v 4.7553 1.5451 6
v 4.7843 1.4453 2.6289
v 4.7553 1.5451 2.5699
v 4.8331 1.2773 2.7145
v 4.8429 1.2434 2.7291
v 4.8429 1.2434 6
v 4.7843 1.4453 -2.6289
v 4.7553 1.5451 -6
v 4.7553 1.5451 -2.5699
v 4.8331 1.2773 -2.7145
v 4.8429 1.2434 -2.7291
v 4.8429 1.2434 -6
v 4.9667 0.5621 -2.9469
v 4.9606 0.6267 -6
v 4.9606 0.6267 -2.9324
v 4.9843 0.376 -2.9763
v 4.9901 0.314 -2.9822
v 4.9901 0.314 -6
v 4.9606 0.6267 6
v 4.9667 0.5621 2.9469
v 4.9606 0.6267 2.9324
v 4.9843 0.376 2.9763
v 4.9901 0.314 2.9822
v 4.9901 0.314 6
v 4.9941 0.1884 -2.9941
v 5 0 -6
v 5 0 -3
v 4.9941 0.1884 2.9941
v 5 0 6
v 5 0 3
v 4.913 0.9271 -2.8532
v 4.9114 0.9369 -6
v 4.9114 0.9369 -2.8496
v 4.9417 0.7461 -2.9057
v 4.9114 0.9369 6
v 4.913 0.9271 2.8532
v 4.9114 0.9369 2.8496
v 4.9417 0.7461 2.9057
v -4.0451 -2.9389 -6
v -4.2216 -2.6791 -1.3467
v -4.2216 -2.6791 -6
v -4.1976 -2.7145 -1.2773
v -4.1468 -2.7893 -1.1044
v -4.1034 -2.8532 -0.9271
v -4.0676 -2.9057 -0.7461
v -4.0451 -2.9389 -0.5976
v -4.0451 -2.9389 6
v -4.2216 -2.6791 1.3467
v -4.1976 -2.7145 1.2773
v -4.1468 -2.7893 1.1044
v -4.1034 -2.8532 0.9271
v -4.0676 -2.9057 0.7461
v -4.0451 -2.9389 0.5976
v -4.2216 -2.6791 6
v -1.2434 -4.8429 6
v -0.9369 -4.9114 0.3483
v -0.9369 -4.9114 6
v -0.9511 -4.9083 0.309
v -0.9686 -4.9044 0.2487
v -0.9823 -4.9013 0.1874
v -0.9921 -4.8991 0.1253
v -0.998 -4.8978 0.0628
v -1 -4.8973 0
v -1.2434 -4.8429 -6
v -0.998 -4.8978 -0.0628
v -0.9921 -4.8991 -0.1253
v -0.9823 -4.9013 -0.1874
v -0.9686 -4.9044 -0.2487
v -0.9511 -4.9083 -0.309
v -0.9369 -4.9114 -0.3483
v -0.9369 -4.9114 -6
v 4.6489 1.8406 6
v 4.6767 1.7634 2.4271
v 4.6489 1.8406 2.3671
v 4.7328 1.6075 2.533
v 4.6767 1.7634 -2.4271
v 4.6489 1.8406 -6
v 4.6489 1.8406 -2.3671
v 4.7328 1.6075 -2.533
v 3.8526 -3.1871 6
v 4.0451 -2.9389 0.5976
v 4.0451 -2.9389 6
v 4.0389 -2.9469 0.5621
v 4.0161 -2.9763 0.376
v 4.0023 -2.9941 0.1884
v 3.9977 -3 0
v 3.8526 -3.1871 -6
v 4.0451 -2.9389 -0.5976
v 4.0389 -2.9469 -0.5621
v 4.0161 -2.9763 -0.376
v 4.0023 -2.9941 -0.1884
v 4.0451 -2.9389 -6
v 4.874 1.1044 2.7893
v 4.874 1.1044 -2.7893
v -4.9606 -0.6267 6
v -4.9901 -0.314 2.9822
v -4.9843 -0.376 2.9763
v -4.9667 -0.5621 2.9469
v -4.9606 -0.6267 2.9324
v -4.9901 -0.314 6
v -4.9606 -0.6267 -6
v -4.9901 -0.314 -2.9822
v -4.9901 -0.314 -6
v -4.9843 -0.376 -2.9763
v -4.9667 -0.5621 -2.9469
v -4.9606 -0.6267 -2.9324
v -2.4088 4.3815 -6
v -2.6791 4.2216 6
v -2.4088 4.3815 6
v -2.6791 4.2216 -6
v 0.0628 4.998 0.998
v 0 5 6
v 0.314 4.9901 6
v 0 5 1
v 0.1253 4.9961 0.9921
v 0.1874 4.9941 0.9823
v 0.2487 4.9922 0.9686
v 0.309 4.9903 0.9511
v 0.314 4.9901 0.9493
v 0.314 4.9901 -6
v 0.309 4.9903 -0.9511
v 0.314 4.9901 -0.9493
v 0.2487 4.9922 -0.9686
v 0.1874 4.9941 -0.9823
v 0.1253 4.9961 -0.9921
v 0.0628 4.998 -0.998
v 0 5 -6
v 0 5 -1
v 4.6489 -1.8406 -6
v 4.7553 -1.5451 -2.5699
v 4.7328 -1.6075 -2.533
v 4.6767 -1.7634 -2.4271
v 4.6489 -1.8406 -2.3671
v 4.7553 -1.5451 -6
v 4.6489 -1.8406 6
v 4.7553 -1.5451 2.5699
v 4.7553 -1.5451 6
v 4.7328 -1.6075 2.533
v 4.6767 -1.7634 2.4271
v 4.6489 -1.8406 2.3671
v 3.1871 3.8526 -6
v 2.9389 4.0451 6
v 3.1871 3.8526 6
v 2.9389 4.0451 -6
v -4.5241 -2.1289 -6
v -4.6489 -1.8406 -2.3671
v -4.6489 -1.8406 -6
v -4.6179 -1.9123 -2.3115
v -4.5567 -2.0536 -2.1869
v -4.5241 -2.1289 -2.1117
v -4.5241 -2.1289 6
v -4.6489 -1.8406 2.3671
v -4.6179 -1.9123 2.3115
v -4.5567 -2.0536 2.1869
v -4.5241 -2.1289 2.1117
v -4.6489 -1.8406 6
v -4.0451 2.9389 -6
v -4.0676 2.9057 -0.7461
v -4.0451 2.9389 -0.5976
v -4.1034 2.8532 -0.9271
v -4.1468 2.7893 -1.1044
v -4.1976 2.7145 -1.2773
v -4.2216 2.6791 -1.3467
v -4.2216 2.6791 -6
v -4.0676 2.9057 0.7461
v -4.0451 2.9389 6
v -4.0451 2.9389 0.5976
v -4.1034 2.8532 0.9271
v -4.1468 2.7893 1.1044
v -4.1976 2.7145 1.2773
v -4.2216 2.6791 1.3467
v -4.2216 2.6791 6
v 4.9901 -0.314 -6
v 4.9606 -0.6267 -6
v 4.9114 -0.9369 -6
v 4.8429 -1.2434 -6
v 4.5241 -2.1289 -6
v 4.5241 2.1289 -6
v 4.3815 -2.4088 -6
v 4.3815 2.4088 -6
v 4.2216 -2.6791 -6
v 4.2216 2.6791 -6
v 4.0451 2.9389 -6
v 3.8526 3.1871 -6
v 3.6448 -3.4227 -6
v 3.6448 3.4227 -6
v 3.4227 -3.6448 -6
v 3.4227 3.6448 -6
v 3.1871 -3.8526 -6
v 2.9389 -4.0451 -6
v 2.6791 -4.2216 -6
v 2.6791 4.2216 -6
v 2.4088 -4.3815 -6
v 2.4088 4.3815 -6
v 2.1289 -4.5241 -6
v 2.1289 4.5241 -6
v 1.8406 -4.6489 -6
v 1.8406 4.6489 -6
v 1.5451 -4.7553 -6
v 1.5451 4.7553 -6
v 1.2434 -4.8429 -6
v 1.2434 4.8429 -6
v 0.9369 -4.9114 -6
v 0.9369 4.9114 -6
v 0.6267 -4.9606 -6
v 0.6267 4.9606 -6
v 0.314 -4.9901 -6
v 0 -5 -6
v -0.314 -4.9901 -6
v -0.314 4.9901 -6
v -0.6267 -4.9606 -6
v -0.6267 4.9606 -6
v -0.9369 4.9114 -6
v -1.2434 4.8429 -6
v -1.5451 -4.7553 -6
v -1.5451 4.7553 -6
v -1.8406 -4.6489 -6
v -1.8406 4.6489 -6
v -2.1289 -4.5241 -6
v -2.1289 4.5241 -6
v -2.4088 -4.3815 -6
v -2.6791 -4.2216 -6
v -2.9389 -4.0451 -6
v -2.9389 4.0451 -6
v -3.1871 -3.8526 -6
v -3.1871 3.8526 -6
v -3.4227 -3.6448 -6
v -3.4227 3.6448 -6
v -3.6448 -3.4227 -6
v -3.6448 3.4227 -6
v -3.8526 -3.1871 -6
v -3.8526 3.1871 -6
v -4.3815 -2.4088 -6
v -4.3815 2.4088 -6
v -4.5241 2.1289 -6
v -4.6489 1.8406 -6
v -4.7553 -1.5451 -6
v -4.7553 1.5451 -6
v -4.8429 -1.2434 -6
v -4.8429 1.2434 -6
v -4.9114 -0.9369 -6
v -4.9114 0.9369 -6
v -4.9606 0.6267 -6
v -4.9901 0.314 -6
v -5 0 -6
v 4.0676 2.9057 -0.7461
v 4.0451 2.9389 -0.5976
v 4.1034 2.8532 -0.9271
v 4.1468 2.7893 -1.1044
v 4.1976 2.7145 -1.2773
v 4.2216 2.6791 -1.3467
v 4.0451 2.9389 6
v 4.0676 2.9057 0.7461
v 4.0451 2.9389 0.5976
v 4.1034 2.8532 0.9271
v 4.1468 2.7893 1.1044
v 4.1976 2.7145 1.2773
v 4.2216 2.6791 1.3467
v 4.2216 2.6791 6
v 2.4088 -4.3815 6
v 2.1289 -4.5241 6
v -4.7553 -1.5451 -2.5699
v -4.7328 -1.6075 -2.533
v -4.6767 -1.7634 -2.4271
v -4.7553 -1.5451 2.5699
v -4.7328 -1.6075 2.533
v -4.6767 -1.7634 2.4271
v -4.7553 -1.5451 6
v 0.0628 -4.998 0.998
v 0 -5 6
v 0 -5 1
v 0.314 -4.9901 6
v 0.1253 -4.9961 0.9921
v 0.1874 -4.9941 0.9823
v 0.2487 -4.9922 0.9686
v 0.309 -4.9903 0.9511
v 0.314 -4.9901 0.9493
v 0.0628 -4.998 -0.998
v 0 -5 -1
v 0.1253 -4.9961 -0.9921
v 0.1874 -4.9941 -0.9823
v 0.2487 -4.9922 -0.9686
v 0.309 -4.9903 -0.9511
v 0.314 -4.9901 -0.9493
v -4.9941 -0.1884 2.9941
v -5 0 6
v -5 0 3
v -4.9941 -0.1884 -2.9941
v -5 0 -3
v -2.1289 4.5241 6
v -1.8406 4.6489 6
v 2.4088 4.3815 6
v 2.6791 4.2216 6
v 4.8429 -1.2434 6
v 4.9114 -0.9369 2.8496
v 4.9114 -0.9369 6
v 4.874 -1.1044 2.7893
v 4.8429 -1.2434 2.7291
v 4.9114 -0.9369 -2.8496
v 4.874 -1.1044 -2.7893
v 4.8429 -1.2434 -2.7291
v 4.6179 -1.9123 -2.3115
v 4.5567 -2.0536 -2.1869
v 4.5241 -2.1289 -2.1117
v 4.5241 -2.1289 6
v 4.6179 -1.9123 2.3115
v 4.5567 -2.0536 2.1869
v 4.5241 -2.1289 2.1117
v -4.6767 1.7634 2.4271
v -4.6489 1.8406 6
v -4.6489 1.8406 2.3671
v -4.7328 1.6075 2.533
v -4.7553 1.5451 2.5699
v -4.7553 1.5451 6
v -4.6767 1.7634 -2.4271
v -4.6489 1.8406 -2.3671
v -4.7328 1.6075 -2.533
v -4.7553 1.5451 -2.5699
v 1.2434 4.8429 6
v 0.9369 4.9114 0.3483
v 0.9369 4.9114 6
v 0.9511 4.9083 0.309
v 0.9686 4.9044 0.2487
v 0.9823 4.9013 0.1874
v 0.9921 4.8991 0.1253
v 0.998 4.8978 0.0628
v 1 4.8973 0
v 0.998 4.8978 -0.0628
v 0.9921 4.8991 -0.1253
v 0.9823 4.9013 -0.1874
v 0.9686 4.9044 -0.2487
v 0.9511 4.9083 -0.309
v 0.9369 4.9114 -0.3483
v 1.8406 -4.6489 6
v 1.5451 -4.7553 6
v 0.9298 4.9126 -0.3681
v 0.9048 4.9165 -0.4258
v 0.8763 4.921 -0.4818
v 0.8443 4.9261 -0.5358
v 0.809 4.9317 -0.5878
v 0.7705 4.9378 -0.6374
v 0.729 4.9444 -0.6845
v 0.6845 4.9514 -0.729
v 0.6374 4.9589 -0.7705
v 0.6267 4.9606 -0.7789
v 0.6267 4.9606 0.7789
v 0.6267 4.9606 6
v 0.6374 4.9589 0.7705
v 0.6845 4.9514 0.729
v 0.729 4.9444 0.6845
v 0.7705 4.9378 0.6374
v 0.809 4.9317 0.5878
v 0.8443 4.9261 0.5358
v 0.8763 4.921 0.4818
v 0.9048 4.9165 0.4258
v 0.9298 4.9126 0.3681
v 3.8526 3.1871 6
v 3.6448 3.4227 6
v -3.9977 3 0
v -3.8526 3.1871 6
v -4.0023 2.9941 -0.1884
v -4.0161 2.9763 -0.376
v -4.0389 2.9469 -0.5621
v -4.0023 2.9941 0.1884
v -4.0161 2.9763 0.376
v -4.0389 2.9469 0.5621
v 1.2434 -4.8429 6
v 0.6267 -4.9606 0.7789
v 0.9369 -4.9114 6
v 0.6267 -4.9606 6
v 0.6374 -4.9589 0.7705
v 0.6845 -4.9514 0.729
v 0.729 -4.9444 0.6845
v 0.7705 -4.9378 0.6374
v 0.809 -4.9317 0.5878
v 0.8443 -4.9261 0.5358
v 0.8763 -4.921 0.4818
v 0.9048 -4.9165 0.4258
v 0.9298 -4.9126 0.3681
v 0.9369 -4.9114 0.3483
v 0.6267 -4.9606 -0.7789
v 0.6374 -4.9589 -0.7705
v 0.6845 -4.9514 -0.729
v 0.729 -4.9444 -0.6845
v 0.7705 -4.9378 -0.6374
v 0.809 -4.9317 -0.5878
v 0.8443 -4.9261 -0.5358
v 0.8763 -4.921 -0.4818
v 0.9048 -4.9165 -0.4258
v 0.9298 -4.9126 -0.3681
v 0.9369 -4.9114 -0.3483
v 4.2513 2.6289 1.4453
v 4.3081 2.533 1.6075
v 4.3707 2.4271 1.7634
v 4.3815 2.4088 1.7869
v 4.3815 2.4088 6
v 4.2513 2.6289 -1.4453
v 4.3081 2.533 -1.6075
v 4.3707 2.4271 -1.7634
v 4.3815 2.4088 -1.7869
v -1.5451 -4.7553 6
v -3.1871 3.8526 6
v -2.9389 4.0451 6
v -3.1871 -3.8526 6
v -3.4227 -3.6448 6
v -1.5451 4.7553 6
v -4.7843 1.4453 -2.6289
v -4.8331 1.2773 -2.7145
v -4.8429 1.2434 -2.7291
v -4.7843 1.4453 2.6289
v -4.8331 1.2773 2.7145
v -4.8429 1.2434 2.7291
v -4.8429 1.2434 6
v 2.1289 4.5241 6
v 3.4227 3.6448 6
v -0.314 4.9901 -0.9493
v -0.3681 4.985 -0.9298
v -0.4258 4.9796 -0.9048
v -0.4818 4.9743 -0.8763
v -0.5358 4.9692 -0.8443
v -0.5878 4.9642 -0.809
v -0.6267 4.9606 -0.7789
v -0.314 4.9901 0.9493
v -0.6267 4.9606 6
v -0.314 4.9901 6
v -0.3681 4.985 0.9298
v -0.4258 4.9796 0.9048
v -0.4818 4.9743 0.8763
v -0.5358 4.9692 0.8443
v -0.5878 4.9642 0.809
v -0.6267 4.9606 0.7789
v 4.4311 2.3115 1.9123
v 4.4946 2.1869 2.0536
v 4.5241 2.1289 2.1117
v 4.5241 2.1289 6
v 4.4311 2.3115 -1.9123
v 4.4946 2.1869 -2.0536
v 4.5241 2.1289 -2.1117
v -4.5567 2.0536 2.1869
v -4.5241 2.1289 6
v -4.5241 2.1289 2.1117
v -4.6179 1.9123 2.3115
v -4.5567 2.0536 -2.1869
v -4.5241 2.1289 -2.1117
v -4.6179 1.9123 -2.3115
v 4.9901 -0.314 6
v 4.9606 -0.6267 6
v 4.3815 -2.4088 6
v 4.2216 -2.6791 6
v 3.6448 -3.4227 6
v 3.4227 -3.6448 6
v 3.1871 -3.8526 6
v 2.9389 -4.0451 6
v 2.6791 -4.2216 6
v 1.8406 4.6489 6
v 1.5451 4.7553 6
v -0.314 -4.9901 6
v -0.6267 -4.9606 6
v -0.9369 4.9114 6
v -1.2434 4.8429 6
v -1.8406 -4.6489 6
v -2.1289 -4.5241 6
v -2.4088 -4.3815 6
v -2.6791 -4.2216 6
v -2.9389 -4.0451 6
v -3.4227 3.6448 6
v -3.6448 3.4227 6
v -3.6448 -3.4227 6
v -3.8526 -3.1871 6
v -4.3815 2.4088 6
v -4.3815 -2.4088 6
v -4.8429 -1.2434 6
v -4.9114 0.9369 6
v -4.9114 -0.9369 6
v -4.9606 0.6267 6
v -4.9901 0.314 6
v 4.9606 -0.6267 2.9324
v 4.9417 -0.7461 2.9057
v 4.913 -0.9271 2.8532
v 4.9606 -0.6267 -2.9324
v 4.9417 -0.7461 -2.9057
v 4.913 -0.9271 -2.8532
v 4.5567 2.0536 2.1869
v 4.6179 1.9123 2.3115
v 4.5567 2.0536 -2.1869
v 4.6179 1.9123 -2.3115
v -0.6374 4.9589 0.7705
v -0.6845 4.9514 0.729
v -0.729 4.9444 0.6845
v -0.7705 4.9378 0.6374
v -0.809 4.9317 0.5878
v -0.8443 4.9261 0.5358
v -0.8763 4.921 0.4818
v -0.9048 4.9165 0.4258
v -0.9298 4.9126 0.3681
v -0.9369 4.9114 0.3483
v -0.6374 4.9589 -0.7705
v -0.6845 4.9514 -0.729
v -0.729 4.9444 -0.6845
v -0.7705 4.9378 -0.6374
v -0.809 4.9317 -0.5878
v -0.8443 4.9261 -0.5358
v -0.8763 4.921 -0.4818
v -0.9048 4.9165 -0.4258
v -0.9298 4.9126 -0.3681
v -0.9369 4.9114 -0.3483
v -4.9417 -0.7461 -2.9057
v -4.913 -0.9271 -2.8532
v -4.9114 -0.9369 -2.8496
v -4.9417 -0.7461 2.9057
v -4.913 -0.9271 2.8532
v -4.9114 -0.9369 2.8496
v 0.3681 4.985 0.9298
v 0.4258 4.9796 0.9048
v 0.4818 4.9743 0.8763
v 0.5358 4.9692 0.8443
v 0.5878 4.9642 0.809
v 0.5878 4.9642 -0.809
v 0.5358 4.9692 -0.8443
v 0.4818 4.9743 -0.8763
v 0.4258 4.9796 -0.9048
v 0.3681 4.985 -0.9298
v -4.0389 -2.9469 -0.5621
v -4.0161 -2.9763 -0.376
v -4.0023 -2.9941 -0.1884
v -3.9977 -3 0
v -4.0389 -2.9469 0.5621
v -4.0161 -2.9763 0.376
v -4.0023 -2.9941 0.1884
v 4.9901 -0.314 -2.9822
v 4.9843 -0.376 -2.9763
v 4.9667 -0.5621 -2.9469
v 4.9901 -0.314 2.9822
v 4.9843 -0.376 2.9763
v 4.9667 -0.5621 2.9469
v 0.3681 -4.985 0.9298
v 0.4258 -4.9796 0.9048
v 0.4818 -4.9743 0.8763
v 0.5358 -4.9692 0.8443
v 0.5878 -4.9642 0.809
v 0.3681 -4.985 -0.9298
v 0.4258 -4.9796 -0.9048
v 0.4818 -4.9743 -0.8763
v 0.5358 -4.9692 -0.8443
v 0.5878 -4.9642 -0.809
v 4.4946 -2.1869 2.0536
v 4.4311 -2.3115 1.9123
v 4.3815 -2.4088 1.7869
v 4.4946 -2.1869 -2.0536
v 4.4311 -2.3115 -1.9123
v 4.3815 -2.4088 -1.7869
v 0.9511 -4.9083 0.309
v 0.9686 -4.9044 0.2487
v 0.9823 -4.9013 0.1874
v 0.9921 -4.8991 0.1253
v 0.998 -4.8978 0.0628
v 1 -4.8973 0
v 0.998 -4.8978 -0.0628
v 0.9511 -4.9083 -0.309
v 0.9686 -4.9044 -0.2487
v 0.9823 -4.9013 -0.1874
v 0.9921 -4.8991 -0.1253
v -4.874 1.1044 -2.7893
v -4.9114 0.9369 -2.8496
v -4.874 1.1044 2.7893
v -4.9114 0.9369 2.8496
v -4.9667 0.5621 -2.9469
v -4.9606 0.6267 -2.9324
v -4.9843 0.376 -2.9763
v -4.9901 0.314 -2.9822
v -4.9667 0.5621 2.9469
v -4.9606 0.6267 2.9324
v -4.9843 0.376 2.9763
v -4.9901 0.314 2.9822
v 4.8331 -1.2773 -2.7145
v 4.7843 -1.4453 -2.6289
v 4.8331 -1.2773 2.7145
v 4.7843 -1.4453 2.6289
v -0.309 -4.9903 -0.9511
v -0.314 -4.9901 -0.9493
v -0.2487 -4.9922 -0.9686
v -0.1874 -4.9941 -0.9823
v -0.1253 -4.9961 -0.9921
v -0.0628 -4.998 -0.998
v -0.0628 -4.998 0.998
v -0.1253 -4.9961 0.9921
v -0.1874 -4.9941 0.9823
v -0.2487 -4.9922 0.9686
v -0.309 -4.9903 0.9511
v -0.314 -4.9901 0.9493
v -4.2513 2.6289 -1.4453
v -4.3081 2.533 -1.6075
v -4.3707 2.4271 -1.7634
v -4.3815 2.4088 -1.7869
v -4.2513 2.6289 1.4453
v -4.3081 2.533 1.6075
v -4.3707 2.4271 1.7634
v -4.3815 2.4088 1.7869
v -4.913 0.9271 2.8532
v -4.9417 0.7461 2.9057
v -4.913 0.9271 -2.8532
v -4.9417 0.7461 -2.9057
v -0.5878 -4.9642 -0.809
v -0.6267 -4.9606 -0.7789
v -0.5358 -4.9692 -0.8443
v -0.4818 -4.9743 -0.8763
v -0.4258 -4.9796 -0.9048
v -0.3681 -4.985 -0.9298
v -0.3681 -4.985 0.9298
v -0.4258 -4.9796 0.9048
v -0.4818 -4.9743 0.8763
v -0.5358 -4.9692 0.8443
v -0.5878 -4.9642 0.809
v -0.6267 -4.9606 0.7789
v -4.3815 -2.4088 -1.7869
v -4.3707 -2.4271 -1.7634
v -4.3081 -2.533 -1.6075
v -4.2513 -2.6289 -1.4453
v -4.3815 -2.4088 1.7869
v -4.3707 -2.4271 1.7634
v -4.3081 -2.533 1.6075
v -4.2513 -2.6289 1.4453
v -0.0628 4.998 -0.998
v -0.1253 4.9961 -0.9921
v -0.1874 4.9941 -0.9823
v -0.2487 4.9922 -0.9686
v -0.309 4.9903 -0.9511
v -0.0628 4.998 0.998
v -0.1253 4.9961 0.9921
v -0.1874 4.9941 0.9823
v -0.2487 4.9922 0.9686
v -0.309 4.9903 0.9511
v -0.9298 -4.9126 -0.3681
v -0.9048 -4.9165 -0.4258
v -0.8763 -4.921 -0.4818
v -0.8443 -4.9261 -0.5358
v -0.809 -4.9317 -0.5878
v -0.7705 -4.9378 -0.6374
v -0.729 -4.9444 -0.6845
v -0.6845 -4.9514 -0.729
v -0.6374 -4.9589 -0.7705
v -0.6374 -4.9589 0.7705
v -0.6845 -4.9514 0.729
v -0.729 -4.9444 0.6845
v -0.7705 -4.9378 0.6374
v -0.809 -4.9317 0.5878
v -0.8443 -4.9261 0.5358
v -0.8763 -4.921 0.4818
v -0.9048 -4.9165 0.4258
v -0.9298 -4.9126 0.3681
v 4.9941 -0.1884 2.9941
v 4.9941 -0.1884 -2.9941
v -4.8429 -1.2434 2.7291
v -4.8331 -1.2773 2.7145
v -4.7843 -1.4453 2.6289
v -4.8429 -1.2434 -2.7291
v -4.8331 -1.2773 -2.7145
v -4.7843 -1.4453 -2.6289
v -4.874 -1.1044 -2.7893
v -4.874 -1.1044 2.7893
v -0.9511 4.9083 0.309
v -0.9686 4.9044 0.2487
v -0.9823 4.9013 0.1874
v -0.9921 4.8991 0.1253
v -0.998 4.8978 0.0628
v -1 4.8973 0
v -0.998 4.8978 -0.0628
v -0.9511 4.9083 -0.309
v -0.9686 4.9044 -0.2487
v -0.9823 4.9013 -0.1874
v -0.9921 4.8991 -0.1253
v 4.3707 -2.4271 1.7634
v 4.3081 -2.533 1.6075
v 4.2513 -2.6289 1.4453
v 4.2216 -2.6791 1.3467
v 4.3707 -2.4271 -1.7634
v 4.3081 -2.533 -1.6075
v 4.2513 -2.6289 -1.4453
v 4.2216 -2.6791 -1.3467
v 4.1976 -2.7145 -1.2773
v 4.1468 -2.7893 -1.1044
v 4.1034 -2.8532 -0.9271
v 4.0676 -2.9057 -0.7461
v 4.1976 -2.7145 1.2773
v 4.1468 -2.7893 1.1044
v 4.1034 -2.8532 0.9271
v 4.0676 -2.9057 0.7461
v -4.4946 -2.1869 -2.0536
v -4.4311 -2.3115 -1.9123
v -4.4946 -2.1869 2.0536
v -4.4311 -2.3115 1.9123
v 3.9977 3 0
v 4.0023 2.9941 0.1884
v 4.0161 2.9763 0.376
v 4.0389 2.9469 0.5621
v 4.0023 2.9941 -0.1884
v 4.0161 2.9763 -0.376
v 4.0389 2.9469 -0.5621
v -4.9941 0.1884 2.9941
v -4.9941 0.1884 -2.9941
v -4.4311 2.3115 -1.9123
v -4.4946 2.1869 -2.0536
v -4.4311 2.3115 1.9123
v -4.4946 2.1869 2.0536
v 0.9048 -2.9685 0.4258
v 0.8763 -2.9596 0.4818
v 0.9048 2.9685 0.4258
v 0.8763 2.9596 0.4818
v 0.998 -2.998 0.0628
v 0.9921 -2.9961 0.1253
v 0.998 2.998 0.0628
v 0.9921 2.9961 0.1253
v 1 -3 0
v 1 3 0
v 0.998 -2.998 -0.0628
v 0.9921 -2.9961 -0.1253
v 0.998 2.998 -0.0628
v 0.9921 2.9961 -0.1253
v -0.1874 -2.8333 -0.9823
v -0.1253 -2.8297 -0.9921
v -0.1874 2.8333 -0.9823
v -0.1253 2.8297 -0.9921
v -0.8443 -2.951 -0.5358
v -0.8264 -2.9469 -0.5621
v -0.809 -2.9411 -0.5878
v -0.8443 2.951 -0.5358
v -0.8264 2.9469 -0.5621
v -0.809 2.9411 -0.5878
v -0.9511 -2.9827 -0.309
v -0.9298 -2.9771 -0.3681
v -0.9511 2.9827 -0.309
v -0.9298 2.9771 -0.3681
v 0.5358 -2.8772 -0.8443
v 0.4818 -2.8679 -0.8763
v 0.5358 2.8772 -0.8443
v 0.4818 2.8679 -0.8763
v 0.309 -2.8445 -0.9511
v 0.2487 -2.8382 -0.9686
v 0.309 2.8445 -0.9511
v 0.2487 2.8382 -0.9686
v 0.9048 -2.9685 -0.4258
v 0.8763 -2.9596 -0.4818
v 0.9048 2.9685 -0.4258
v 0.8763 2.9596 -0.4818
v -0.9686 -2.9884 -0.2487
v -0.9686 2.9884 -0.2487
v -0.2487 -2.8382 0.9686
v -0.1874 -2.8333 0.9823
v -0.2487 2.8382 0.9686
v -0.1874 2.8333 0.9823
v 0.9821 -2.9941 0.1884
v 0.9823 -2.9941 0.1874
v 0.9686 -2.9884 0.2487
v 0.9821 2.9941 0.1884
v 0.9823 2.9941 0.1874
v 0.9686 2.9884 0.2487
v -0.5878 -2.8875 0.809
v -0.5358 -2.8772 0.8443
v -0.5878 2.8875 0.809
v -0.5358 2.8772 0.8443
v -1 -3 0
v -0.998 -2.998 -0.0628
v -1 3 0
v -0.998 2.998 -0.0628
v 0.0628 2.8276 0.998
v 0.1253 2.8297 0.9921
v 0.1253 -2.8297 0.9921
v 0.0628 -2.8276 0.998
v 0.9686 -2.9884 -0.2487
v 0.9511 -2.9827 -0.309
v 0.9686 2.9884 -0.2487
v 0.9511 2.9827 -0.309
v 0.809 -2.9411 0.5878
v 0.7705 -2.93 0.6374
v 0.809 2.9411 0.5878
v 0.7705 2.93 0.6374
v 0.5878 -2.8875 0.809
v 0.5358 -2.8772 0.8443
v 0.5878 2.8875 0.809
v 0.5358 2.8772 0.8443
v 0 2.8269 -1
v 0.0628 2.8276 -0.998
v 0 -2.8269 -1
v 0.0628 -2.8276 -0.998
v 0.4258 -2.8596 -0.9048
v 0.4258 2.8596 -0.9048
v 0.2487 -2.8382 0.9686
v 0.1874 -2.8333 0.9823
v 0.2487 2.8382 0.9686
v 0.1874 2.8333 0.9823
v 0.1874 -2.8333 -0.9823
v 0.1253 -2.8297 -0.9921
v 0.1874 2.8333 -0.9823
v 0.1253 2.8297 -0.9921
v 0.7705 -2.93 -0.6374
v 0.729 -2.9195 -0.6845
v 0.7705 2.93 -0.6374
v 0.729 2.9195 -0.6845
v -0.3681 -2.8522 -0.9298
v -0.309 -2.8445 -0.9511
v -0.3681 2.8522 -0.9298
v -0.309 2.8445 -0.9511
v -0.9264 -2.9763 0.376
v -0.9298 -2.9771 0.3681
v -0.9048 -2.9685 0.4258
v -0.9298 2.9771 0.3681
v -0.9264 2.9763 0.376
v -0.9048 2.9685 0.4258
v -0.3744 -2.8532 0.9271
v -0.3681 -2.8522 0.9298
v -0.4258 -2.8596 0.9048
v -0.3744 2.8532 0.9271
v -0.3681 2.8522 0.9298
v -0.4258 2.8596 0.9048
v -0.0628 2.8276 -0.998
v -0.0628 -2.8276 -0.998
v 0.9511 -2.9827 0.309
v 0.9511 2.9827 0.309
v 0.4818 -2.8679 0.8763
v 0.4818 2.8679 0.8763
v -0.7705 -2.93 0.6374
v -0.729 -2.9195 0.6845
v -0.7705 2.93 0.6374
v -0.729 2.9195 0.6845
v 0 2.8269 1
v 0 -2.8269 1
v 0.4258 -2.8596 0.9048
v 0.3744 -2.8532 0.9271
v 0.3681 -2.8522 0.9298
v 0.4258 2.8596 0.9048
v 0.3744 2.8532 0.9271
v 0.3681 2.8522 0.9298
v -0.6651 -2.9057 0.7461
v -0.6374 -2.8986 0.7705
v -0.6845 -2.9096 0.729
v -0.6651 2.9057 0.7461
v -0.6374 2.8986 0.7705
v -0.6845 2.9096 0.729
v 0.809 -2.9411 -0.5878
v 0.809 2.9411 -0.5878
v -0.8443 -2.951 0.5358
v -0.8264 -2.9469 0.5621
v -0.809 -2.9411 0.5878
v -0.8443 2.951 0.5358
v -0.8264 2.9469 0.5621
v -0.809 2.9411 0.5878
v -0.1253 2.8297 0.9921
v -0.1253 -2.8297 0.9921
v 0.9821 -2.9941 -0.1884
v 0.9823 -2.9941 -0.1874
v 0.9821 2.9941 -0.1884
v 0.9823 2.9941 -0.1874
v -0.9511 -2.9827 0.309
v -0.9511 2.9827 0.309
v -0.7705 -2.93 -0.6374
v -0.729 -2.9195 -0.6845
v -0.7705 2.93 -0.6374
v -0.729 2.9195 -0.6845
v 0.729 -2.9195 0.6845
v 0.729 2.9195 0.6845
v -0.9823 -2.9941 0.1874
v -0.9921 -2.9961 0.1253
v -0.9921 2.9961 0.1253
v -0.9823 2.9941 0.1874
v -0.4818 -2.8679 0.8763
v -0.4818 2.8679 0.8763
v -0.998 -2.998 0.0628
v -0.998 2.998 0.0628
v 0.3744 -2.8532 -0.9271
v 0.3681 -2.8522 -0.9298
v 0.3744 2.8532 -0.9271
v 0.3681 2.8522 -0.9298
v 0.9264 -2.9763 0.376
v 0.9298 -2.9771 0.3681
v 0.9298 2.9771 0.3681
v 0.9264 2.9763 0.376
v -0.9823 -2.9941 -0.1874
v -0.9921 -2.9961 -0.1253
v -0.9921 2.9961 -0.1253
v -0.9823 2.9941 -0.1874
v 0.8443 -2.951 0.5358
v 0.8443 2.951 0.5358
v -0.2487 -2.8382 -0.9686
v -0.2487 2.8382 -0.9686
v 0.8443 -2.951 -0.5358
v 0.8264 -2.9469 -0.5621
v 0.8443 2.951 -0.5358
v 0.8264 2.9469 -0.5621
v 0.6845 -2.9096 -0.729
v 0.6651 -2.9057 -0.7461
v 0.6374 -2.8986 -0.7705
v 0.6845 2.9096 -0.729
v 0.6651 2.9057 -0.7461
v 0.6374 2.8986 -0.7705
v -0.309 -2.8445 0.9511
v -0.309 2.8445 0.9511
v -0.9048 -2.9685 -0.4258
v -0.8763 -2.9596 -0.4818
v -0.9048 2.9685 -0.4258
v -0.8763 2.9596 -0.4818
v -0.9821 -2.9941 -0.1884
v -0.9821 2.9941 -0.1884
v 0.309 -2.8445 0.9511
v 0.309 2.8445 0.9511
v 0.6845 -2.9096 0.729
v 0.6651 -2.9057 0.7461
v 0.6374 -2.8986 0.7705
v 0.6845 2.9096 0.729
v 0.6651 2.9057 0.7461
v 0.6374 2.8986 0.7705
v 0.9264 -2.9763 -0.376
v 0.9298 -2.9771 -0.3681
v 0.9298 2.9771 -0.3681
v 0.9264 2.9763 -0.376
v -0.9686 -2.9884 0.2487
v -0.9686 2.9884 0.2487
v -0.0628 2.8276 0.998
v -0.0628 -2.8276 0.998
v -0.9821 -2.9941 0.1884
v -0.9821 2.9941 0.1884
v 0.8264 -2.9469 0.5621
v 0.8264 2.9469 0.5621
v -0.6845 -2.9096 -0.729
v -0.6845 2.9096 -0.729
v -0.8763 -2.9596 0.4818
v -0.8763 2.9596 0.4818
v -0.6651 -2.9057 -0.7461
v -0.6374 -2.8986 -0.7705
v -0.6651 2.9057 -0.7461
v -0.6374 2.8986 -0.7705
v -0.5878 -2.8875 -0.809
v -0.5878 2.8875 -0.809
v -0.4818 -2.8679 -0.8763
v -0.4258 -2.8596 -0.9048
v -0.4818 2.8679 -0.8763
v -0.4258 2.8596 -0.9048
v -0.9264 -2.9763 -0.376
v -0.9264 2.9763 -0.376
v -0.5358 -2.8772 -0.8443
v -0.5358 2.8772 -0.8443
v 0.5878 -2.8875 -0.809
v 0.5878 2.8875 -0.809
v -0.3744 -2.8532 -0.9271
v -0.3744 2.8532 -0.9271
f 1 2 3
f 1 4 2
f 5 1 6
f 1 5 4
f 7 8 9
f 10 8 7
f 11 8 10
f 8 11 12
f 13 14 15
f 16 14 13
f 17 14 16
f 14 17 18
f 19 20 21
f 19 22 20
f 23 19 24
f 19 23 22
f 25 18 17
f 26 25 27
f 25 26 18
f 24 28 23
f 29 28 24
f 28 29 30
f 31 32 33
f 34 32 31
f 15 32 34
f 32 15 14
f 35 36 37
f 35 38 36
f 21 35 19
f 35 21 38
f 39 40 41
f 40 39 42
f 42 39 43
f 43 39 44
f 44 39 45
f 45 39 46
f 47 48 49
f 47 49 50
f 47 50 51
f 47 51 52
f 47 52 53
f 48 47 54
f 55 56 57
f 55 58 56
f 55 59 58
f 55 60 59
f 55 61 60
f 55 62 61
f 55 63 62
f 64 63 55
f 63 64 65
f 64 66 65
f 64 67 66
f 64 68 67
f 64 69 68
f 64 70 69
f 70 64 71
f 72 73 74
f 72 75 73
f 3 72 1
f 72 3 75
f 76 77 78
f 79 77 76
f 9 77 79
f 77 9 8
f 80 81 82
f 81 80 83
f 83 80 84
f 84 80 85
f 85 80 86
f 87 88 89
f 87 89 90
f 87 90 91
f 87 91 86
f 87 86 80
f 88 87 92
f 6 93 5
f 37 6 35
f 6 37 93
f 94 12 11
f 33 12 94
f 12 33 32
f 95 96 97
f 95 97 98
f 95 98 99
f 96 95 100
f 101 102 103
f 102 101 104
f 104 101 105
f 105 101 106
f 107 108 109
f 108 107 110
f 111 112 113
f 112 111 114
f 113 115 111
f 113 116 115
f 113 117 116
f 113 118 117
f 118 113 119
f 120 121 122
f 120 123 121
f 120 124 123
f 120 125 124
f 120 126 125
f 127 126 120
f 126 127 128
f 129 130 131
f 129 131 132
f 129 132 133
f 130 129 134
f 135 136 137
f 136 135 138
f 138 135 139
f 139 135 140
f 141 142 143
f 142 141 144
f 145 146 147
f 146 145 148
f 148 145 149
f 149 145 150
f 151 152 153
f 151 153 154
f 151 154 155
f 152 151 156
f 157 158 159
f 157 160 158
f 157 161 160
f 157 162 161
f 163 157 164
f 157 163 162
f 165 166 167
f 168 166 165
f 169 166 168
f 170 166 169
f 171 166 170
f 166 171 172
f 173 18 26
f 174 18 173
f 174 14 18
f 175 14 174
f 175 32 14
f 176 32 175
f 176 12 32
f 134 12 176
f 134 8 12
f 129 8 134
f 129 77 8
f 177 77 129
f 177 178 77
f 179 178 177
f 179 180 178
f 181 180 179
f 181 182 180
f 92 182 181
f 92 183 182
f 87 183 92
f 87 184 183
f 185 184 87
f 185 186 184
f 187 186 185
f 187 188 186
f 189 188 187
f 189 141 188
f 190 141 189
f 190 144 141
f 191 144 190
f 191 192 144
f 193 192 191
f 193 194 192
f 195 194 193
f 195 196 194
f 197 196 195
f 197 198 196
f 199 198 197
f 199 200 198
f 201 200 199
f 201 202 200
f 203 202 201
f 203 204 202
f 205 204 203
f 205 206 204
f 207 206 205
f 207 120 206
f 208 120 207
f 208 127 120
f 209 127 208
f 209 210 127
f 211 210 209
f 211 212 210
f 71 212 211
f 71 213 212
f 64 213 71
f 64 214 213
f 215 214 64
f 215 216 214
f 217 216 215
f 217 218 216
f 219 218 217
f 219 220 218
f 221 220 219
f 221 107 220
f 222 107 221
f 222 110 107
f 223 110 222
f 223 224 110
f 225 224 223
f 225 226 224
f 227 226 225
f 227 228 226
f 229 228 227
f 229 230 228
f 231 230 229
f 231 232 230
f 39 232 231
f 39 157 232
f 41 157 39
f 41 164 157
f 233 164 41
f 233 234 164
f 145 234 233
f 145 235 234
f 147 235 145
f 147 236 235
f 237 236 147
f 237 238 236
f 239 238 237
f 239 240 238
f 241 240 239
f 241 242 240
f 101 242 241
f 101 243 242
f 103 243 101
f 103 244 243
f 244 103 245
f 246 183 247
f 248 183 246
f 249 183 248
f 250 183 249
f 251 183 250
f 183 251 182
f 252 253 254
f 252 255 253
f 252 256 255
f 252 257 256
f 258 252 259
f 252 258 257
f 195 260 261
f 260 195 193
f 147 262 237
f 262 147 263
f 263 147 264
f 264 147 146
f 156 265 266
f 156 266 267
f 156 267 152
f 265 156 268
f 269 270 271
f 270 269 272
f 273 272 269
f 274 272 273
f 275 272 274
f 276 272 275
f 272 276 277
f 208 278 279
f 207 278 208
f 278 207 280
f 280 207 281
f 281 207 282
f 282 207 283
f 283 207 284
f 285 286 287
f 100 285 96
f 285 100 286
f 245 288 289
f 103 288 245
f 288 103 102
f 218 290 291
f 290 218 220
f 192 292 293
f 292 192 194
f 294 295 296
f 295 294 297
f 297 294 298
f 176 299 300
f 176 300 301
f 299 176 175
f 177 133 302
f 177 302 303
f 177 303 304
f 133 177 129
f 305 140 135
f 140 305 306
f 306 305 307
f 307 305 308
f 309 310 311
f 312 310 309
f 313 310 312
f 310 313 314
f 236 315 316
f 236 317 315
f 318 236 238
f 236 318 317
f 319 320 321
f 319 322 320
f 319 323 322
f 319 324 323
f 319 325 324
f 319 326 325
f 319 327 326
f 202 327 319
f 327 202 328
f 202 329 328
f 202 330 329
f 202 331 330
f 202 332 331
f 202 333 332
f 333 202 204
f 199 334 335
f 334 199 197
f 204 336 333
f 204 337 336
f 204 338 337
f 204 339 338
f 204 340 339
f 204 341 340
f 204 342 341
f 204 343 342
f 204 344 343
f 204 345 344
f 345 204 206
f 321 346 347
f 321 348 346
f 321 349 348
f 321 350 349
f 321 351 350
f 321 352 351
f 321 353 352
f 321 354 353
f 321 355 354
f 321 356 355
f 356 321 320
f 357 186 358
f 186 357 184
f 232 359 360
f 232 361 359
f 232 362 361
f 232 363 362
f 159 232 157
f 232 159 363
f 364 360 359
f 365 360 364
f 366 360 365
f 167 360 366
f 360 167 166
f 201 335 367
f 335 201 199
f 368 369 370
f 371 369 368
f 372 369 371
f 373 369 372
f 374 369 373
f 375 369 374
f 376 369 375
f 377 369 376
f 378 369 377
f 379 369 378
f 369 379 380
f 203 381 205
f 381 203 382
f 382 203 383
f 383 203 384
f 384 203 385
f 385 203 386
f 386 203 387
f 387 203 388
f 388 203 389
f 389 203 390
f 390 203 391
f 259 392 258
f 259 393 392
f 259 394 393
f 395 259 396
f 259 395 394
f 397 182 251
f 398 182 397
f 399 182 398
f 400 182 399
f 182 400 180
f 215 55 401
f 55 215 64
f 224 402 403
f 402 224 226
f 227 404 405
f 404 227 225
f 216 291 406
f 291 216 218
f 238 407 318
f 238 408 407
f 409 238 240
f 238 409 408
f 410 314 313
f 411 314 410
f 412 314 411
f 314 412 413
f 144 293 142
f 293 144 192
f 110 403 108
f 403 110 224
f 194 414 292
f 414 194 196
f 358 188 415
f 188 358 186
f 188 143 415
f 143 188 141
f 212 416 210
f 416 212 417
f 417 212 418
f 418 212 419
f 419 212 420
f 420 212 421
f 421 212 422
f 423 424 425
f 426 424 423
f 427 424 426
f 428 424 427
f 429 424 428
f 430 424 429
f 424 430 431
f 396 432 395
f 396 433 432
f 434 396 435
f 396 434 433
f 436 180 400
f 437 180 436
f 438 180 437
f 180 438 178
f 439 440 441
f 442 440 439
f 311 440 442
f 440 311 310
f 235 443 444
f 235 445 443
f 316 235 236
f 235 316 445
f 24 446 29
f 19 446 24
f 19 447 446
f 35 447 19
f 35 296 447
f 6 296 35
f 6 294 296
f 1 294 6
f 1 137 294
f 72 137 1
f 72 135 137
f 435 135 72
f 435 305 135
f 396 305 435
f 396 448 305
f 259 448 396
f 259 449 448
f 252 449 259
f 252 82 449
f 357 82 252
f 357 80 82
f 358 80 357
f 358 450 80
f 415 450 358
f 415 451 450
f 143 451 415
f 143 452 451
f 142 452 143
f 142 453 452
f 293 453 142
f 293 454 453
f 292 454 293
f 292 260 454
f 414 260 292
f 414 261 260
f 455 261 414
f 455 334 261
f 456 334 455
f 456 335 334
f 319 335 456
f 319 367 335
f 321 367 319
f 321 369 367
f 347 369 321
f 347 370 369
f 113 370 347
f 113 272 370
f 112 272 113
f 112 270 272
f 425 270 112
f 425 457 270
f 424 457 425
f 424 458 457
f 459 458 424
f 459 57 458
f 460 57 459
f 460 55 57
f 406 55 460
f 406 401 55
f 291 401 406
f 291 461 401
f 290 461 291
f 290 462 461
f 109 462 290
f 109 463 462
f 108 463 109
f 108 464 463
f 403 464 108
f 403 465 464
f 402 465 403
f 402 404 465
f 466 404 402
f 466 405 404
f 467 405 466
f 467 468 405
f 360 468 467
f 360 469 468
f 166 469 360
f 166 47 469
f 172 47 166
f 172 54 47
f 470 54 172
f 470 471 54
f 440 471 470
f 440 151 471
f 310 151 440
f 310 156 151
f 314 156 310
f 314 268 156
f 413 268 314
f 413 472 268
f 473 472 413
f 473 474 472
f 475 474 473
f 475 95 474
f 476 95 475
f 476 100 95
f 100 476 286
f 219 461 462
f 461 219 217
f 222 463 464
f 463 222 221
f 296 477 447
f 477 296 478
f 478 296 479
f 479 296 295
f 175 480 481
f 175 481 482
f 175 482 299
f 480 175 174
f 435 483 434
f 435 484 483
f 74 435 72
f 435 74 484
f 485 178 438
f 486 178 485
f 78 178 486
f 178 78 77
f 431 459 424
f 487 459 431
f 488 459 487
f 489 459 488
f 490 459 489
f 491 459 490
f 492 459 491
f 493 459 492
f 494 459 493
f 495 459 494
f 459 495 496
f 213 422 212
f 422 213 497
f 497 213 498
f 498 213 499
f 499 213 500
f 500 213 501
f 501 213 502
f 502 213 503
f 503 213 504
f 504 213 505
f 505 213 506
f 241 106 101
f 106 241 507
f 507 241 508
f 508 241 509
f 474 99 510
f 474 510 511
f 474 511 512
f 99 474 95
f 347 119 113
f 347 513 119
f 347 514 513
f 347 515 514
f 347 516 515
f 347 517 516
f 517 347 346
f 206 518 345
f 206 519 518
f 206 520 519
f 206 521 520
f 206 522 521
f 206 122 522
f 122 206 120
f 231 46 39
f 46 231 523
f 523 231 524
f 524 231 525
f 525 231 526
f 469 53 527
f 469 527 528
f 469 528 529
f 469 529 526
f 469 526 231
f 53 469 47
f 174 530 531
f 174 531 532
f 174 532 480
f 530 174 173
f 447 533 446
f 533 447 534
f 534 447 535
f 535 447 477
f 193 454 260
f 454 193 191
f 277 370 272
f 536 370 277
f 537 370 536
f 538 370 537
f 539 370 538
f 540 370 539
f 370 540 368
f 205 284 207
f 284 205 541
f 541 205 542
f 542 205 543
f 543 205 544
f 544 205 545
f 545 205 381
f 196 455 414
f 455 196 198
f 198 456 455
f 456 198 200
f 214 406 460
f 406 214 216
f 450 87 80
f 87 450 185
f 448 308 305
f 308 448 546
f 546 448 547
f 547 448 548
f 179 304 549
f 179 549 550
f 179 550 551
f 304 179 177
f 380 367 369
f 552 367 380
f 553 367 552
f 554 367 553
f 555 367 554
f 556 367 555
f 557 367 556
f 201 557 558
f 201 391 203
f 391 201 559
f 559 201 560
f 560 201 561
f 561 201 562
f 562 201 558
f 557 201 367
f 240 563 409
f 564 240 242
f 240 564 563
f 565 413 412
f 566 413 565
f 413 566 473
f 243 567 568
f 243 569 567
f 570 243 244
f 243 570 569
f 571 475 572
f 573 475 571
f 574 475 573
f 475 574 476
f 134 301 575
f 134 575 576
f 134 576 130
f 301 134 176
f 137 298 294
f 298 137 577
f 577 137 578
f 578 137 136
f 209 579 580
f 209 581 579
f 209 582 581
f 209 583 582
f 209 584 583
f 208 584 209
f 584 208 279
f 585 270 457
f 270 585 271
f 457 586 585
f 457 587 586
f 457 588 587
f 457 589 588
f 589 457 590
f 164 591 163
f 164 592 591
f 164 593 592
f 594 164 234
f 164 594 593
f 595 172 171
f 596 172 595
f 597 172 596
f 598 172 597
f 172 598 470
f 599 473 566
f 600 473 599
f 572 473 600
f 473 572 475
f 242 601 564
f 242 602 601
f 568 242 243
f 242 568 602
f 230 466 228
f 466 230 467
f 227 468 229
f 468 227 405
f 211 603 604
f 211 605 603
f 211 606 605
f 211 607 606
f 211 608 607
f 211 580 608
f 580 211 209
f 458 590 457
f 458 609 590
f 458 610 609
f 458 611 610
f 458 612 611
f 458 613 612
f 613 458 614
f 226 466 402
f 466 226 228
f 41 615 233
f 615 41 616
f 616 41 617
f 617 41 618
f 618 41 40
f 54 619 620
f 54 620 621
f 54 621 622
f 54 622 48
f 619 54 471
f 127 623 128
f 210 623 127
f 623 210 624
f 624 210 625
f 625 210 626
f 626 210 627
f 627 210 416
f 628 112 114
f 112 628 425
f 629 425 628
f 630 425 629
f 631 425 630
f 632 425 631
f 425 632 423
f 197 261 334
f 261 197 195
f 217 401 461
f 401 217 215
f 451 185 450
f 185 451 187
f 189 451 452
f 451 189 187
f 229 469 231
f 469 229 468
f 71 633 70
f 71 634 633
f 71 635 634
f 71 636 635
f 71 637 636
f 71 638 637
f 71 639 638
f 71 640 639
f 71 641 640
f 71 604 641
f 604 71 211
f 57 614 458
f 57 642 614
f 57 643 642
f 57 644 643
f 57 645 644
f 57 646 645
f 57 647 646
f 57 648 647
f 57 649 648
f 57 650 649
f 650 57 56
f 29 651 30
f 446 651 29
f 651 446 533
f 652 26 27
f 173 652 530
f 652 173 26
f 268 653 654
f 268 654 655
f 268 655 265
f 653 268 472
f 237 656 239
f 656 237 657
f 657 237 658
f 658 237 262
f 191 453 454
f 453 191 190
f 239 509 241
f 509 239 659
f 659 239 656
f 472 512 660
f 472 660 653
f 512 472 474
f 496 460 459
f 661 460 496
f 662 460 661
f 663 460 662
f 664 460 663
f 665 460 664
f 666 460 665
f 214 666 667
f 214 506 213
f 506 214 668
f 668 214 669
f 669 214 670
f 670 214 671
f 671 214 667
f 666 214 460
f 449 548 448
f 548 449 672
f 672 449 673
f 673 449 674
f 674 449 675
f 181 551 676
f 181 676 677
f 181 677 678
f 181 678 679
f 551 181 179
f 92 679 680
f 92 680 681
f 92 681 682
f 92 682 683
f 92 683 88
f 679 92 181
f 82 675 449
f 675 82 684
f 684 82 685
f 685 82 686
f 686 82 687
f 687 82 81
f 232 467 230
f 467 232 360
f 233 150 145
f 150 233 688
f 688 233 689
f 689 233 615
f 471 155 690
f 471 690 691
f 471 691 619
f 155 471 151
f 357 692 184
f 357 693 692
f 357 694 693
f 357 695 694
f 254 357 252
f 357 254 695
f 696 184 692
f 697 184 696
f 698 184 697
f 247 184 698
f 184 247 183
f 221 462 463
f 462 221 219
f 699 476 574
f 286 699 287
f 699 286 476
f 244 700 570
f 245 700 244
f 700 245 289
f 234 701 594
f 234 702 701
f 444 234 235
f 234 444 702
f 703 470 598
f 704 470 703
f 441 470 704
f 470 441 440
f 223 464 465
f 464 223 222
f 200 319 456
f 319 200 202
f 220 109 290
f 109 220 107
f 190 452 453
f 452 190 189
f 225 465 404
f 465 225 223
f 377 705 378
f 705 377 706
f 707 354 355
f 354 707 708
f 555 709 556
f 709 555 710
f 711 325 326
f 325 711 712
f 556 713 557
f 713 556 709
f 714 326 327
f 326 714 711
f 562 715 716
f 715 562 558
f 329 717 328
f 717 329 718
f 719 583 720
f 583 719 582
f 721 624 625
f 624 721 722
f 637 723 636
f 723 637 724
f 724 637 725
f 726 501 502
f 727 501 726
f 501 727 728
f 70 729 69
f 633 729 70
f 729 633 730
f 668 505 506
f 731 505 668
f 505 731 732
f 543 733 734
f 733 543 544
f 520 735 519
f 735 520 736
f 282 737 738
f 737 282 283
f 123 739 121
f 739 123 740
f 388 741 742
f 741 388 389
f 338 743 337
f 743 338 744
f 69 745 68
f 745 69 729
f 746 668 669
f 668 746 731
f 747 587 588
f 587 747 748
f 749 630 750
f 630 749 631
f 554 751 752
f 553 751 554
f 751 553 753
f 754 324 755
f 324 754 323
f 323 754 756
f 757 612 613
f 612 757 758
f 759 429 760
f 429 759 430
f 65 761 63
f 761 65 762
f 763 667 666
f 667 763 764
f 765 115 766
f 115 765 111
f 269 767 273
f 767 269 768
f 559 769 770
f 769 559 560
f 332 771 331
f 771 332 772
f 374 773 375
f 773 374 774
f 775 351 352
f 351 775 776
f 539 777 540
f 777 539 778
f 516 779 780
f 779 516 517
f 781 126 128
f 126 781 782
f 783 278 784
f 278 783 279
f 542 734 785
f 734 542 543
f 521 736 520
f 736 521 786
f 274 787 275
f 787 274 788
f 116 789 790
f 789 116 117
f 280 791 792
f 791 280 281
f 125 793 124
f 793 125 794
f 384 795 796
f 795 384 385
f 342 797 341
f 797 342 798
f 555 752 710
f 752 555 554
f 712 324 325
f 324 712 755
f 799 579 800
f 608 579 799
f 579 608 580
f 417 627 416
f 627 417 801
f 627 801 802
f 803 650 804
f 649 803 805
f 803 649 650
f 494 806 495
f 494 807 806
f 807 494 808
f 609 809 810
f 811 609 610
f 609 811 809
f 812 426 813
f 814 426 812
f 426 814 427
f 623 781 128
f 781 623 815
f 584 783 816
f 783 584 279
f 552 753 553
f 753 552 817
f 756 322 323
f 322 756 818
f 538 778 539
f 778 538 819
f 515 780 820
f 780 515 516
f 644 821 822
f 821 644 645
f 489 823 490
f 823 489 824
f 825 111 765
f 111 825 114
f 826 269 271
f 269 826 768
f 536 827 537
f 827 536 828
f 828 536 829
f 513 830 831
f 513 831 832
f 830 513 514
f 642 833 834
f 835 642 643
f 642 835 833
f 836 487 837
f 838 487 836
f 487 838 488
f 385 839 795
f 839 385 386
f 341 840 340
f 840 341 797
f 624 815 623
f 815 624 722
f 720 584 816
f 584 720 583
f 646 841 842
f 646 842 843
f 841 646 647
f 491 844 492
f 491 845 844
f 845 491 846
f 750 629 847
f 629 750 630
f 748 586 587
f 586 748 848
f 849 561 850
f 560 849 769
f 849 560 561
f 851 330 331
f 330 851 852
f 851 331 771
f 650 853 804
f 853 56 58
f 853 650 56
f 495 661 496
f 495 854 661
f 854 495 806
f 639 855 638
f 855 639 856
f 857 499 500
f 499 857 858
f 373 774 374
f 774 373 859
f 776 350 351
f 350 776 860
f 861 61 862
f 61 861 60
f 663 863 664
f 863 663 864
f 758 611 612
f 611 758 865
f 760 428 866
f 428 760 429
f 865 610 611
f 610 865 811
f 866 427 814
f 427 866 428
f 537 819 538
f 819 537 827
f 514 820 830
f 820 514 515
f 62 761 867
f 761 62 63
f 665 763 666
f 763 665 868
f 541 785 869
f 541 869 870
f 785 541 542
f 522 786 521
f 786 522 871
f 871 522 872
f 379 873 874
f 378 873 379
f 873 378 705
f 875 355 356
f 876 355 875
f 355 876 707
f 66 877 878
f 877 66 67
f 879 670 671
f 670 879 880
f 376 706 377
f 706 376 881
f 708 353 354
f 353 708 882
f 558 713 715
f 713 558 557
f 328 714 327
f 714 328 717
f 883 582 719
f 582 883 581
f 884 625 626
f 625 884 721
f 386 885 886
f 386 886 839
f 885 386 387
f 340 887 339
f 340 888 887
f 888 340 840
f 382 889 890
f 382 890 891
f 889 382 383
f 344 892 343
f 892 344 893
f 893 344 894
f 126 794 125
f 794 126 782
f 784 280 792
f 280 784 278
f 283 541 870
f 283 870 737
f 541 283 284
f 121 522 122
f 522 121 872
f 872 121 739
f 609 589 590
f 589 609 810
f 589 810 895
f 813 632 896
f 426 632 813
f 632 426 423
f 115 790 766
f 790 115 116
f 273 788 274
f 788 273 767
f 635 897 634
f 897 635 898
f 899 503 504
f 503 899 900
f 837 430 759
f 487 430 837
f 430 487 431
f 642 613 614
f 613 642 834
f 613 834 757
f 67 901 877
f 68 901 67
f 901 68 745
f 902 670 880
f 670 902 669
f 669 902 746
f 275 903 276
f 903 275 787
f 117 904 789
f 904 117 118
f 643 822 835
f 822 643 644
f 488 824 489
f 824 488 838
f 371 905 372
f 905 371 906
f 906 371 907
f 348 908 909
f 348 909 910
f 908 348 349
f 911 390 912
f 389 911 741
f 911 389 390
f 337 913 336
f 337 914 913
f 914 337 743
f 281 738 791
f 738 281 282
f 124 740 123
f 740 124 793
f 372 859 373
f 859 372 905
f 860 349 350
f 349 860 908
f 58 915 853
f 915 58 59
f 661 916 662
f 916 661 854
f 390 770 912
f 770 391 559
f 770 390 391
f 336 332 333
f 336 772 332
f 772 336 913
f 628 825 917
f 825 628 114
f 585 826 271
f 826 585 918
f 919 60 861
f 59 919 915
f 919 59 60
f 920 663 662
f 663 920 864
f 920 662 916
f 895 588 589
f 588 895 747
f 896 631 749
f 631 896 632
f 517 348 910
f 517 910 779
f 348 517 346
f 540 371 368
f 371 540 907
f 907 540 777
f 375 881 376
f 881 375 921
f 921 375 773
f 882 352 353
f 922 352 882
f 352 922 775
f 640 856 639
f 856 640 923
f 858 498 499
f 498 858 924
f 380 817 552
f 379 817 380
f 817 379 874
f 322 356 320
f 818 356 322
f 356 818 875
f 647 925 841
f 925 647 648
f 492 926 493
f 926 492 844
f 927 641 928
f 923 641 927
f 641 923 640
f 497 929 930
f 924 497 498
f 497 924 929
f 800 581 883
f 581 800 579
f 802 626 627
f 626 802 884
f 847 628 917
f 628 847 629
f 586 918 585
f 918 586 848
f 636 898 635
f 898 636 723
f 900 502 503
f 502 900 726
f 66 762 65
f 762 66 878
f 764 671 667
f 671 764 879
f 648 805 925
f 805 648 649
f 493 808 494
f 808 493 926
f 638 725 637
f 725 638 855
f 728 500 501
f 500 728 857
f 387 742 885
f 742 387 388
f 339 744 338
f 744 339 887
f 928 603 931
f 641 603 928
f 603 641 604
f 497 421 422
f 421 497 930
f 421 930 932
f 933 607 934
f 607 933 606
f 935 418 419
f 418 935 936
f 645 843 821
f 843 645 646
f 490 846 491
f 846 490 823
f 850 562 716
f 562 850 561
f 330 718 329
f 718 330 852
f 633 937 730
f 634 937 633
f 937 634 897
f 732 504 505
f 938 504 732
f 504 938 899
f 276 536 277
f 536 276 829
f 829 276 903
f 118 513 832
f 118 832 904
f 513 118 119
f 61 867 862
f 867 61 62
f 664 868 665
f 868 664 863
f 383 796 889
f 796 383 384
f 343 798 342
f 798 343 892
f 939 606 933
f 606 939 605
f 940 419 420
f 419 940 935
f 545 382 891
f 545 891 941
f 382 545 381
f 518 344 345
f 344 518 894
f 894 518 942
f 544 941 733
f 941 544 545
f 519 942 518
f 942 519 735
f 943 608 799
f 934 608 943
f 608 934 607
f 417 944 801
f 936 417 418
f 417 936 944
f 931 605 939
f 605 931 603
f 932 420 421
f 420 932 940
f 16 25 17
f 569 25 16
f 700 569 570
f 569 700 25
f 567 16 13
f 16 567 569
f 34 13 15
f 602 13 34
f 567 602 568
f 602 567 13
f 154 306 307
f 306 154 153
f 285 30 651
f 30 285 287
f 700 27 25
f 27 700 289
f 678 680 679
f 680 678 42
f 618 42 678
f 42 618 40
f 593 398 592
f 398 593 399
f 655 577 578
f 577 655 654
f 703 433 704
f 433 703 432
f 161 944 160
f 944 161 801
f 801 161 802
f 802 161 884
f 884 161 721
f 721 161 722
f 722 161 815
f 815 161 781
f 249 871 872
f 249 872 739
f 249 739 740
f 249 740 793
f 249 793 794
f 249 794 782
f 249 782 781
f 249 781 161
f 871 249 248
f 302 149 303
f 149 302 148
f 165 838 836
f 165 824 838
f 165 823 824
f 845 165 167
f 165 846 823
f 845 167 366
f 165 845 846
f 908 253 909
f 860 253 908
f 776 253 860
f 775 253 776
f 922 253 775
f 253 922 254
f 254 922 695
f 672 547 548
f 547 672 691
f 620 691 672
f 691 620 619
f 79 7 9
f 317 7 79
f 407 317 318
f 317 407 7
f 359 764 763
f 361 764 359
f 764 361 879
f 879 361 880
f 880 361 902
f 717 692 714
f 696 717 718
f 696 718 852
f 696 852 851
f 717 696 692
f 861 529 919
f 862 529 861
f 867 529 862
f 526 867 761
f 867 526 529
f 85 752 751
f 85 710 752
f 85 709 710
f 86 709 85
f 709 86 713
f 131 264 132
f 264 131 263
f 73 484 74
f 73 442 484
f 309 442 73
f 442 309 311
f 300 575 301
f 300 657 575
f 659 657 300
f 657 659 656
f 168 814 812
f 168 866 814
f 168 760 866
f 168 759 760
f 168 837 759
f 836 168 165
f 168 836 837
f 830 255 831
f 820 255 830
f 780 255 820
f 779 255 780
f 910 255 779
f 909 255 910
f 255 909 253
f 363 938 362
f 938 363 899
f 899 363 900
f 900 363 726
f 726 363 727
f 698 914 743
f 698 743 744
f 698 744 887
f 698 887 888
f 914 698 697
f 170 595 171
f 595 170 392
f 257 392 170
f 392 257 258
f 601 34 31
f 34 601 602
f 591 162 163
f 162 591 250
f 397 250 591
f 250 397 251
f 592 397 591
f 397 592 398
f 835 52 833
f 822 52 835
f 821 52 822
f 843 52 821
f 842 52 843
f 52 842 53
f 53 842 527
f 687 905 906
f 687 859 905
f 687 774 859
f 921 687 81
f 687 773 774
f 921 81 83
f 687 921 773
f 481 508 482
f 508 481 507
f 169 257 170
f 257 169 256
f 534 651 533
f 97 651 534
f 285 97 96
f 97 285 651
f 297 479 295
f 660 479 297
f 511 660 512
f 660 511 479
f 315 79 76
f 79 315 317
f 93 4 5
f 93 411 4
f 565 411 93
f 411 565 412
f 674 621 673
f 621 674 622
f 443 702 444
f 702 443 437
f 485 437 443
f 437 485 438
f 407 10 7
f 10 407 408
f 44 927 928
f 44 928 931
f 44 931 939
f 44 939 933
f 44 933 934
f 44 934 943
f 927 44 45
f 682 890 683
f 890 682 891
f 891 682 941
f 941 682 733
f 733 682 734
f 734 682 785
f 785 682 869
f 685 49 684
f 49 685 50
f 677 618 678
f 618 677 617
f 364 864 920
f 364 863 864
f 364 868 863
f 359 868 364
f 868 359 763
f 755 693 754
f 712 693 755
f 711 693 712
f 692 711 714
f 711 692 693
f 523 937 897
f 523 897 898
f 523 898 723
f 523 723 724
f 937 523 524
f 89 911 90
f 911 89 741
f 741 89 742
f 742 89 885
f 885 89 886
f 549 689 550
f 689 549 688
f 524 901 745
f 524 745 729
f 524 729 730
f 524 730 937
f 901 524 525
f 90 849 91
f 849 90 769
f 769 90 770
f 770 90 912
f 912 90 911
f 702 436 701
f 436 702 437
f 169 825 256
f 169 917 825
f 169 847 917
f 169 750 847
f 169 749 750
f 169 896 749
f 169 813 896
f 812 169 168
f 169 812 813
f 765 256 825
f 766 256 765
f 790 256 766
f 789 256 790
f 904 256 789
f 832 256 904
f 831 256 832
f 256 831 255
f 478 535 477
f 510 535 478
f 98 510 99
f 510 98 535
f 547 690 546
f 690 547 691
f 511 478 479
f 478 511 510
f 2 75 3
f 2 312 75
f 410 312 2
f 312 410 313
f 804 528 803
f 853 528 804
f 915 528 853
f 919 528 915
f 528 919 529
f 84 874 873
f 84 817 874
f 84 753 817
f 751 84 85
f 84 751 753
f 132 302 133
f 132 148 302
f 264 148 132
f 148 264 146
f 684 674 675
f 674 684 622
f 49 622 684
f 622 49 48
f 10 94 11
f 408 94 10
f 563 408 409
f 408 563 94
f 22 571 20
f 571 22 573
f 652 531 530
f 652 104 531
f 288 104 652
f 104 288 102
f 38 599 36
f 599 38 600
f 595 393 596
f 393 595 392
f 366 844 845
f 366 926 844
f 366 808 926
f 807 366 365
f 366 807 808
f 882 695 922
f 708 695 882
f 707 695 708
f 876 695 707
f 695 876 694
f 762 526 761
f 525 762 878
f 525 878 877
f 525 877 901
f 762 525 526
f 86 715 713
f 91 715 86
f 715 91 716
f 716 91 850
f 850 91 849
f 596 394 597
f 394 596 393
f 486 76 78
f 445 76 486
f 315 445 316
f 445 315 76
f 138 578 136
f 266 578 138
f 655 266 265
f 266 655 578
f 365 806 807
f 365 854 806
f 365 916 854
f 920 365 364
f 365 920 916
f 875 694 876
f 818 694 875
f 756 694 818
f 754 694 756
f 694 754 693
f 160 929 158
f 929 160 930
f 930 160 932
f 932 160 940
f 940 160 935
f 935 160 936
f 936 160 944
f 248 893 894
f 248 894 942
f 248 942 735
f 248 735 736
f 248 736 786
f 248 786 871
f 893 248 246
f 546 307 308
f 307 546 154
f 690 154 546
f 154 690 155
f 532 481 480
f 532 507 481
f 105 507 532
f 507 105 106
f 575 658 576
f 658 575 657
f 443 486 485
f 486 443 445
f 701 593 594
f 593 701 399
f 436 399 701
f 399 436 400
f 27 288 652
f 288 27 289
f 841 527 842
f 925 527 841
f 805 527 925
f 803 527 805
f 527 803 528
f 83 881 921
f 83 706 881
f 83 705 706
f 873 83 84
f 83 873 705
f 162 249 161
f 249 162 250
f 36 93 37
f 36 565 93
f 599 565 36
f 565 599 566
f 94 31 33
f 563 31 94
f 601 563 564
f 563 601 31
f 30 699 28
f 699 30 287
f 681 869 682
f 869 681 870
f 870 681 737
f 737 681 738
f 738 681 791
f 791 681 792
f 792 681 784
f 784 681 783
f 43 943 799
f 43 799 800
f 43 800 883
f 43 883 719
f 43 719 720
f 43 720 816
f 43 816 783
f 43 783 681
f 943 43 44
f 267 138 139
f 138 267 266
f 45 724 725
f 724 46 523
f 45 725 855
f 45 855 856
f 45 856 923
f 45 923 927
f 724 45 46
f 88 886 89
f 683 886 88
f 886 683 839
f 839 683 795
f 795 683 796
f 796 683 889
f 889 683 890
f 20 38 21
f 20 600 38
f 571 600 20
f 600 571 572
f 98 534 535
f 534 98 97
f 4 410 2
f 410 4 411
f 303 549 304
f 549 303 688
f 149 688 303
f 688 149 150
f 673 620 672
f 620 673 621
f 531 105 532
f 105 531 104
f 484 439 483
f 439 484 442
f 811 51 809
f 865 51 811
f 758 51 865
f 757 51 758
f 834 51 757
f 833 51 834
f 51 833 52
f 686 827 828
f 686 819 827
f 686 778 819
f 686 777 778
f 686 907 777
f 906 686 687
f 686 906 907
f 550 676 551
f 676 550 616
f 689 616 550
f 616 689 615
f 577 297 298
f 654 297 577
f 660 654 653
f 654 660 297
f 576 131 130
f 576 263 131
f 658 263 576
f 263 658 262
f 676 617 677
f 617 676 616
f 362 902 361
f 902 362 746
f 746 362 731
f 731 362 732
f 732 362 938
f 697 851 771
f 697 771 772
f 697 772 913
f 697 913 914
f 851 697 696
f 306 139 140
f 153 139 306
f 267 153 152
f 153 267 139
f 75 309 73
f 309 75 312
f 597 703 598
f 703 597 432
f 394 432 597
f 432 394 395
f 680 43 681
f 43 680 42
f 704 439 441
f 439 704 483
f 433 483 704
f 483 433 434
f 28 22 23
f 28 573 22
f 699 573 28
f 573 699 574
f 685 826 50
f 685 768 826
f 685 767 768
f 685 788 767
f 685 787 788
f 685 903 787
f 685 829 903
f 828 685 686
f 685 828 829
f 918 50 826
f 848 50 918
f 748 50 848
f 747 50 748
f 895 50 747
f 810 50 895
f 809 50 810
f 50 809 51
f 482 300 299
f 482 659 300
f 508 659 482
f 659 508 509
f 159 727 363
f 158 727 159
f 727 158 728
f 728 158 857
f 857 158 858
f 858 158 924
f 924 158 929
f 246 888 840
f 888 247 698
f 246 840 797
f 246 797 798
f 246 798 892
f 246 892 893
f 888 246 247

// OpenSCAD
difference() {
	// start objects
	cylinder (h = 12, r=5, center = true, $fn=100);
        // first object that will subtracted
	#rotate ([90,0,0]) cylinder (h = 15, r=1, center = true, $fn=100);
        // second object that will be subtracted
	#rotate ([0,90,0]) cylinder (h = 15, r=3, center = true, $fn=100);
}
